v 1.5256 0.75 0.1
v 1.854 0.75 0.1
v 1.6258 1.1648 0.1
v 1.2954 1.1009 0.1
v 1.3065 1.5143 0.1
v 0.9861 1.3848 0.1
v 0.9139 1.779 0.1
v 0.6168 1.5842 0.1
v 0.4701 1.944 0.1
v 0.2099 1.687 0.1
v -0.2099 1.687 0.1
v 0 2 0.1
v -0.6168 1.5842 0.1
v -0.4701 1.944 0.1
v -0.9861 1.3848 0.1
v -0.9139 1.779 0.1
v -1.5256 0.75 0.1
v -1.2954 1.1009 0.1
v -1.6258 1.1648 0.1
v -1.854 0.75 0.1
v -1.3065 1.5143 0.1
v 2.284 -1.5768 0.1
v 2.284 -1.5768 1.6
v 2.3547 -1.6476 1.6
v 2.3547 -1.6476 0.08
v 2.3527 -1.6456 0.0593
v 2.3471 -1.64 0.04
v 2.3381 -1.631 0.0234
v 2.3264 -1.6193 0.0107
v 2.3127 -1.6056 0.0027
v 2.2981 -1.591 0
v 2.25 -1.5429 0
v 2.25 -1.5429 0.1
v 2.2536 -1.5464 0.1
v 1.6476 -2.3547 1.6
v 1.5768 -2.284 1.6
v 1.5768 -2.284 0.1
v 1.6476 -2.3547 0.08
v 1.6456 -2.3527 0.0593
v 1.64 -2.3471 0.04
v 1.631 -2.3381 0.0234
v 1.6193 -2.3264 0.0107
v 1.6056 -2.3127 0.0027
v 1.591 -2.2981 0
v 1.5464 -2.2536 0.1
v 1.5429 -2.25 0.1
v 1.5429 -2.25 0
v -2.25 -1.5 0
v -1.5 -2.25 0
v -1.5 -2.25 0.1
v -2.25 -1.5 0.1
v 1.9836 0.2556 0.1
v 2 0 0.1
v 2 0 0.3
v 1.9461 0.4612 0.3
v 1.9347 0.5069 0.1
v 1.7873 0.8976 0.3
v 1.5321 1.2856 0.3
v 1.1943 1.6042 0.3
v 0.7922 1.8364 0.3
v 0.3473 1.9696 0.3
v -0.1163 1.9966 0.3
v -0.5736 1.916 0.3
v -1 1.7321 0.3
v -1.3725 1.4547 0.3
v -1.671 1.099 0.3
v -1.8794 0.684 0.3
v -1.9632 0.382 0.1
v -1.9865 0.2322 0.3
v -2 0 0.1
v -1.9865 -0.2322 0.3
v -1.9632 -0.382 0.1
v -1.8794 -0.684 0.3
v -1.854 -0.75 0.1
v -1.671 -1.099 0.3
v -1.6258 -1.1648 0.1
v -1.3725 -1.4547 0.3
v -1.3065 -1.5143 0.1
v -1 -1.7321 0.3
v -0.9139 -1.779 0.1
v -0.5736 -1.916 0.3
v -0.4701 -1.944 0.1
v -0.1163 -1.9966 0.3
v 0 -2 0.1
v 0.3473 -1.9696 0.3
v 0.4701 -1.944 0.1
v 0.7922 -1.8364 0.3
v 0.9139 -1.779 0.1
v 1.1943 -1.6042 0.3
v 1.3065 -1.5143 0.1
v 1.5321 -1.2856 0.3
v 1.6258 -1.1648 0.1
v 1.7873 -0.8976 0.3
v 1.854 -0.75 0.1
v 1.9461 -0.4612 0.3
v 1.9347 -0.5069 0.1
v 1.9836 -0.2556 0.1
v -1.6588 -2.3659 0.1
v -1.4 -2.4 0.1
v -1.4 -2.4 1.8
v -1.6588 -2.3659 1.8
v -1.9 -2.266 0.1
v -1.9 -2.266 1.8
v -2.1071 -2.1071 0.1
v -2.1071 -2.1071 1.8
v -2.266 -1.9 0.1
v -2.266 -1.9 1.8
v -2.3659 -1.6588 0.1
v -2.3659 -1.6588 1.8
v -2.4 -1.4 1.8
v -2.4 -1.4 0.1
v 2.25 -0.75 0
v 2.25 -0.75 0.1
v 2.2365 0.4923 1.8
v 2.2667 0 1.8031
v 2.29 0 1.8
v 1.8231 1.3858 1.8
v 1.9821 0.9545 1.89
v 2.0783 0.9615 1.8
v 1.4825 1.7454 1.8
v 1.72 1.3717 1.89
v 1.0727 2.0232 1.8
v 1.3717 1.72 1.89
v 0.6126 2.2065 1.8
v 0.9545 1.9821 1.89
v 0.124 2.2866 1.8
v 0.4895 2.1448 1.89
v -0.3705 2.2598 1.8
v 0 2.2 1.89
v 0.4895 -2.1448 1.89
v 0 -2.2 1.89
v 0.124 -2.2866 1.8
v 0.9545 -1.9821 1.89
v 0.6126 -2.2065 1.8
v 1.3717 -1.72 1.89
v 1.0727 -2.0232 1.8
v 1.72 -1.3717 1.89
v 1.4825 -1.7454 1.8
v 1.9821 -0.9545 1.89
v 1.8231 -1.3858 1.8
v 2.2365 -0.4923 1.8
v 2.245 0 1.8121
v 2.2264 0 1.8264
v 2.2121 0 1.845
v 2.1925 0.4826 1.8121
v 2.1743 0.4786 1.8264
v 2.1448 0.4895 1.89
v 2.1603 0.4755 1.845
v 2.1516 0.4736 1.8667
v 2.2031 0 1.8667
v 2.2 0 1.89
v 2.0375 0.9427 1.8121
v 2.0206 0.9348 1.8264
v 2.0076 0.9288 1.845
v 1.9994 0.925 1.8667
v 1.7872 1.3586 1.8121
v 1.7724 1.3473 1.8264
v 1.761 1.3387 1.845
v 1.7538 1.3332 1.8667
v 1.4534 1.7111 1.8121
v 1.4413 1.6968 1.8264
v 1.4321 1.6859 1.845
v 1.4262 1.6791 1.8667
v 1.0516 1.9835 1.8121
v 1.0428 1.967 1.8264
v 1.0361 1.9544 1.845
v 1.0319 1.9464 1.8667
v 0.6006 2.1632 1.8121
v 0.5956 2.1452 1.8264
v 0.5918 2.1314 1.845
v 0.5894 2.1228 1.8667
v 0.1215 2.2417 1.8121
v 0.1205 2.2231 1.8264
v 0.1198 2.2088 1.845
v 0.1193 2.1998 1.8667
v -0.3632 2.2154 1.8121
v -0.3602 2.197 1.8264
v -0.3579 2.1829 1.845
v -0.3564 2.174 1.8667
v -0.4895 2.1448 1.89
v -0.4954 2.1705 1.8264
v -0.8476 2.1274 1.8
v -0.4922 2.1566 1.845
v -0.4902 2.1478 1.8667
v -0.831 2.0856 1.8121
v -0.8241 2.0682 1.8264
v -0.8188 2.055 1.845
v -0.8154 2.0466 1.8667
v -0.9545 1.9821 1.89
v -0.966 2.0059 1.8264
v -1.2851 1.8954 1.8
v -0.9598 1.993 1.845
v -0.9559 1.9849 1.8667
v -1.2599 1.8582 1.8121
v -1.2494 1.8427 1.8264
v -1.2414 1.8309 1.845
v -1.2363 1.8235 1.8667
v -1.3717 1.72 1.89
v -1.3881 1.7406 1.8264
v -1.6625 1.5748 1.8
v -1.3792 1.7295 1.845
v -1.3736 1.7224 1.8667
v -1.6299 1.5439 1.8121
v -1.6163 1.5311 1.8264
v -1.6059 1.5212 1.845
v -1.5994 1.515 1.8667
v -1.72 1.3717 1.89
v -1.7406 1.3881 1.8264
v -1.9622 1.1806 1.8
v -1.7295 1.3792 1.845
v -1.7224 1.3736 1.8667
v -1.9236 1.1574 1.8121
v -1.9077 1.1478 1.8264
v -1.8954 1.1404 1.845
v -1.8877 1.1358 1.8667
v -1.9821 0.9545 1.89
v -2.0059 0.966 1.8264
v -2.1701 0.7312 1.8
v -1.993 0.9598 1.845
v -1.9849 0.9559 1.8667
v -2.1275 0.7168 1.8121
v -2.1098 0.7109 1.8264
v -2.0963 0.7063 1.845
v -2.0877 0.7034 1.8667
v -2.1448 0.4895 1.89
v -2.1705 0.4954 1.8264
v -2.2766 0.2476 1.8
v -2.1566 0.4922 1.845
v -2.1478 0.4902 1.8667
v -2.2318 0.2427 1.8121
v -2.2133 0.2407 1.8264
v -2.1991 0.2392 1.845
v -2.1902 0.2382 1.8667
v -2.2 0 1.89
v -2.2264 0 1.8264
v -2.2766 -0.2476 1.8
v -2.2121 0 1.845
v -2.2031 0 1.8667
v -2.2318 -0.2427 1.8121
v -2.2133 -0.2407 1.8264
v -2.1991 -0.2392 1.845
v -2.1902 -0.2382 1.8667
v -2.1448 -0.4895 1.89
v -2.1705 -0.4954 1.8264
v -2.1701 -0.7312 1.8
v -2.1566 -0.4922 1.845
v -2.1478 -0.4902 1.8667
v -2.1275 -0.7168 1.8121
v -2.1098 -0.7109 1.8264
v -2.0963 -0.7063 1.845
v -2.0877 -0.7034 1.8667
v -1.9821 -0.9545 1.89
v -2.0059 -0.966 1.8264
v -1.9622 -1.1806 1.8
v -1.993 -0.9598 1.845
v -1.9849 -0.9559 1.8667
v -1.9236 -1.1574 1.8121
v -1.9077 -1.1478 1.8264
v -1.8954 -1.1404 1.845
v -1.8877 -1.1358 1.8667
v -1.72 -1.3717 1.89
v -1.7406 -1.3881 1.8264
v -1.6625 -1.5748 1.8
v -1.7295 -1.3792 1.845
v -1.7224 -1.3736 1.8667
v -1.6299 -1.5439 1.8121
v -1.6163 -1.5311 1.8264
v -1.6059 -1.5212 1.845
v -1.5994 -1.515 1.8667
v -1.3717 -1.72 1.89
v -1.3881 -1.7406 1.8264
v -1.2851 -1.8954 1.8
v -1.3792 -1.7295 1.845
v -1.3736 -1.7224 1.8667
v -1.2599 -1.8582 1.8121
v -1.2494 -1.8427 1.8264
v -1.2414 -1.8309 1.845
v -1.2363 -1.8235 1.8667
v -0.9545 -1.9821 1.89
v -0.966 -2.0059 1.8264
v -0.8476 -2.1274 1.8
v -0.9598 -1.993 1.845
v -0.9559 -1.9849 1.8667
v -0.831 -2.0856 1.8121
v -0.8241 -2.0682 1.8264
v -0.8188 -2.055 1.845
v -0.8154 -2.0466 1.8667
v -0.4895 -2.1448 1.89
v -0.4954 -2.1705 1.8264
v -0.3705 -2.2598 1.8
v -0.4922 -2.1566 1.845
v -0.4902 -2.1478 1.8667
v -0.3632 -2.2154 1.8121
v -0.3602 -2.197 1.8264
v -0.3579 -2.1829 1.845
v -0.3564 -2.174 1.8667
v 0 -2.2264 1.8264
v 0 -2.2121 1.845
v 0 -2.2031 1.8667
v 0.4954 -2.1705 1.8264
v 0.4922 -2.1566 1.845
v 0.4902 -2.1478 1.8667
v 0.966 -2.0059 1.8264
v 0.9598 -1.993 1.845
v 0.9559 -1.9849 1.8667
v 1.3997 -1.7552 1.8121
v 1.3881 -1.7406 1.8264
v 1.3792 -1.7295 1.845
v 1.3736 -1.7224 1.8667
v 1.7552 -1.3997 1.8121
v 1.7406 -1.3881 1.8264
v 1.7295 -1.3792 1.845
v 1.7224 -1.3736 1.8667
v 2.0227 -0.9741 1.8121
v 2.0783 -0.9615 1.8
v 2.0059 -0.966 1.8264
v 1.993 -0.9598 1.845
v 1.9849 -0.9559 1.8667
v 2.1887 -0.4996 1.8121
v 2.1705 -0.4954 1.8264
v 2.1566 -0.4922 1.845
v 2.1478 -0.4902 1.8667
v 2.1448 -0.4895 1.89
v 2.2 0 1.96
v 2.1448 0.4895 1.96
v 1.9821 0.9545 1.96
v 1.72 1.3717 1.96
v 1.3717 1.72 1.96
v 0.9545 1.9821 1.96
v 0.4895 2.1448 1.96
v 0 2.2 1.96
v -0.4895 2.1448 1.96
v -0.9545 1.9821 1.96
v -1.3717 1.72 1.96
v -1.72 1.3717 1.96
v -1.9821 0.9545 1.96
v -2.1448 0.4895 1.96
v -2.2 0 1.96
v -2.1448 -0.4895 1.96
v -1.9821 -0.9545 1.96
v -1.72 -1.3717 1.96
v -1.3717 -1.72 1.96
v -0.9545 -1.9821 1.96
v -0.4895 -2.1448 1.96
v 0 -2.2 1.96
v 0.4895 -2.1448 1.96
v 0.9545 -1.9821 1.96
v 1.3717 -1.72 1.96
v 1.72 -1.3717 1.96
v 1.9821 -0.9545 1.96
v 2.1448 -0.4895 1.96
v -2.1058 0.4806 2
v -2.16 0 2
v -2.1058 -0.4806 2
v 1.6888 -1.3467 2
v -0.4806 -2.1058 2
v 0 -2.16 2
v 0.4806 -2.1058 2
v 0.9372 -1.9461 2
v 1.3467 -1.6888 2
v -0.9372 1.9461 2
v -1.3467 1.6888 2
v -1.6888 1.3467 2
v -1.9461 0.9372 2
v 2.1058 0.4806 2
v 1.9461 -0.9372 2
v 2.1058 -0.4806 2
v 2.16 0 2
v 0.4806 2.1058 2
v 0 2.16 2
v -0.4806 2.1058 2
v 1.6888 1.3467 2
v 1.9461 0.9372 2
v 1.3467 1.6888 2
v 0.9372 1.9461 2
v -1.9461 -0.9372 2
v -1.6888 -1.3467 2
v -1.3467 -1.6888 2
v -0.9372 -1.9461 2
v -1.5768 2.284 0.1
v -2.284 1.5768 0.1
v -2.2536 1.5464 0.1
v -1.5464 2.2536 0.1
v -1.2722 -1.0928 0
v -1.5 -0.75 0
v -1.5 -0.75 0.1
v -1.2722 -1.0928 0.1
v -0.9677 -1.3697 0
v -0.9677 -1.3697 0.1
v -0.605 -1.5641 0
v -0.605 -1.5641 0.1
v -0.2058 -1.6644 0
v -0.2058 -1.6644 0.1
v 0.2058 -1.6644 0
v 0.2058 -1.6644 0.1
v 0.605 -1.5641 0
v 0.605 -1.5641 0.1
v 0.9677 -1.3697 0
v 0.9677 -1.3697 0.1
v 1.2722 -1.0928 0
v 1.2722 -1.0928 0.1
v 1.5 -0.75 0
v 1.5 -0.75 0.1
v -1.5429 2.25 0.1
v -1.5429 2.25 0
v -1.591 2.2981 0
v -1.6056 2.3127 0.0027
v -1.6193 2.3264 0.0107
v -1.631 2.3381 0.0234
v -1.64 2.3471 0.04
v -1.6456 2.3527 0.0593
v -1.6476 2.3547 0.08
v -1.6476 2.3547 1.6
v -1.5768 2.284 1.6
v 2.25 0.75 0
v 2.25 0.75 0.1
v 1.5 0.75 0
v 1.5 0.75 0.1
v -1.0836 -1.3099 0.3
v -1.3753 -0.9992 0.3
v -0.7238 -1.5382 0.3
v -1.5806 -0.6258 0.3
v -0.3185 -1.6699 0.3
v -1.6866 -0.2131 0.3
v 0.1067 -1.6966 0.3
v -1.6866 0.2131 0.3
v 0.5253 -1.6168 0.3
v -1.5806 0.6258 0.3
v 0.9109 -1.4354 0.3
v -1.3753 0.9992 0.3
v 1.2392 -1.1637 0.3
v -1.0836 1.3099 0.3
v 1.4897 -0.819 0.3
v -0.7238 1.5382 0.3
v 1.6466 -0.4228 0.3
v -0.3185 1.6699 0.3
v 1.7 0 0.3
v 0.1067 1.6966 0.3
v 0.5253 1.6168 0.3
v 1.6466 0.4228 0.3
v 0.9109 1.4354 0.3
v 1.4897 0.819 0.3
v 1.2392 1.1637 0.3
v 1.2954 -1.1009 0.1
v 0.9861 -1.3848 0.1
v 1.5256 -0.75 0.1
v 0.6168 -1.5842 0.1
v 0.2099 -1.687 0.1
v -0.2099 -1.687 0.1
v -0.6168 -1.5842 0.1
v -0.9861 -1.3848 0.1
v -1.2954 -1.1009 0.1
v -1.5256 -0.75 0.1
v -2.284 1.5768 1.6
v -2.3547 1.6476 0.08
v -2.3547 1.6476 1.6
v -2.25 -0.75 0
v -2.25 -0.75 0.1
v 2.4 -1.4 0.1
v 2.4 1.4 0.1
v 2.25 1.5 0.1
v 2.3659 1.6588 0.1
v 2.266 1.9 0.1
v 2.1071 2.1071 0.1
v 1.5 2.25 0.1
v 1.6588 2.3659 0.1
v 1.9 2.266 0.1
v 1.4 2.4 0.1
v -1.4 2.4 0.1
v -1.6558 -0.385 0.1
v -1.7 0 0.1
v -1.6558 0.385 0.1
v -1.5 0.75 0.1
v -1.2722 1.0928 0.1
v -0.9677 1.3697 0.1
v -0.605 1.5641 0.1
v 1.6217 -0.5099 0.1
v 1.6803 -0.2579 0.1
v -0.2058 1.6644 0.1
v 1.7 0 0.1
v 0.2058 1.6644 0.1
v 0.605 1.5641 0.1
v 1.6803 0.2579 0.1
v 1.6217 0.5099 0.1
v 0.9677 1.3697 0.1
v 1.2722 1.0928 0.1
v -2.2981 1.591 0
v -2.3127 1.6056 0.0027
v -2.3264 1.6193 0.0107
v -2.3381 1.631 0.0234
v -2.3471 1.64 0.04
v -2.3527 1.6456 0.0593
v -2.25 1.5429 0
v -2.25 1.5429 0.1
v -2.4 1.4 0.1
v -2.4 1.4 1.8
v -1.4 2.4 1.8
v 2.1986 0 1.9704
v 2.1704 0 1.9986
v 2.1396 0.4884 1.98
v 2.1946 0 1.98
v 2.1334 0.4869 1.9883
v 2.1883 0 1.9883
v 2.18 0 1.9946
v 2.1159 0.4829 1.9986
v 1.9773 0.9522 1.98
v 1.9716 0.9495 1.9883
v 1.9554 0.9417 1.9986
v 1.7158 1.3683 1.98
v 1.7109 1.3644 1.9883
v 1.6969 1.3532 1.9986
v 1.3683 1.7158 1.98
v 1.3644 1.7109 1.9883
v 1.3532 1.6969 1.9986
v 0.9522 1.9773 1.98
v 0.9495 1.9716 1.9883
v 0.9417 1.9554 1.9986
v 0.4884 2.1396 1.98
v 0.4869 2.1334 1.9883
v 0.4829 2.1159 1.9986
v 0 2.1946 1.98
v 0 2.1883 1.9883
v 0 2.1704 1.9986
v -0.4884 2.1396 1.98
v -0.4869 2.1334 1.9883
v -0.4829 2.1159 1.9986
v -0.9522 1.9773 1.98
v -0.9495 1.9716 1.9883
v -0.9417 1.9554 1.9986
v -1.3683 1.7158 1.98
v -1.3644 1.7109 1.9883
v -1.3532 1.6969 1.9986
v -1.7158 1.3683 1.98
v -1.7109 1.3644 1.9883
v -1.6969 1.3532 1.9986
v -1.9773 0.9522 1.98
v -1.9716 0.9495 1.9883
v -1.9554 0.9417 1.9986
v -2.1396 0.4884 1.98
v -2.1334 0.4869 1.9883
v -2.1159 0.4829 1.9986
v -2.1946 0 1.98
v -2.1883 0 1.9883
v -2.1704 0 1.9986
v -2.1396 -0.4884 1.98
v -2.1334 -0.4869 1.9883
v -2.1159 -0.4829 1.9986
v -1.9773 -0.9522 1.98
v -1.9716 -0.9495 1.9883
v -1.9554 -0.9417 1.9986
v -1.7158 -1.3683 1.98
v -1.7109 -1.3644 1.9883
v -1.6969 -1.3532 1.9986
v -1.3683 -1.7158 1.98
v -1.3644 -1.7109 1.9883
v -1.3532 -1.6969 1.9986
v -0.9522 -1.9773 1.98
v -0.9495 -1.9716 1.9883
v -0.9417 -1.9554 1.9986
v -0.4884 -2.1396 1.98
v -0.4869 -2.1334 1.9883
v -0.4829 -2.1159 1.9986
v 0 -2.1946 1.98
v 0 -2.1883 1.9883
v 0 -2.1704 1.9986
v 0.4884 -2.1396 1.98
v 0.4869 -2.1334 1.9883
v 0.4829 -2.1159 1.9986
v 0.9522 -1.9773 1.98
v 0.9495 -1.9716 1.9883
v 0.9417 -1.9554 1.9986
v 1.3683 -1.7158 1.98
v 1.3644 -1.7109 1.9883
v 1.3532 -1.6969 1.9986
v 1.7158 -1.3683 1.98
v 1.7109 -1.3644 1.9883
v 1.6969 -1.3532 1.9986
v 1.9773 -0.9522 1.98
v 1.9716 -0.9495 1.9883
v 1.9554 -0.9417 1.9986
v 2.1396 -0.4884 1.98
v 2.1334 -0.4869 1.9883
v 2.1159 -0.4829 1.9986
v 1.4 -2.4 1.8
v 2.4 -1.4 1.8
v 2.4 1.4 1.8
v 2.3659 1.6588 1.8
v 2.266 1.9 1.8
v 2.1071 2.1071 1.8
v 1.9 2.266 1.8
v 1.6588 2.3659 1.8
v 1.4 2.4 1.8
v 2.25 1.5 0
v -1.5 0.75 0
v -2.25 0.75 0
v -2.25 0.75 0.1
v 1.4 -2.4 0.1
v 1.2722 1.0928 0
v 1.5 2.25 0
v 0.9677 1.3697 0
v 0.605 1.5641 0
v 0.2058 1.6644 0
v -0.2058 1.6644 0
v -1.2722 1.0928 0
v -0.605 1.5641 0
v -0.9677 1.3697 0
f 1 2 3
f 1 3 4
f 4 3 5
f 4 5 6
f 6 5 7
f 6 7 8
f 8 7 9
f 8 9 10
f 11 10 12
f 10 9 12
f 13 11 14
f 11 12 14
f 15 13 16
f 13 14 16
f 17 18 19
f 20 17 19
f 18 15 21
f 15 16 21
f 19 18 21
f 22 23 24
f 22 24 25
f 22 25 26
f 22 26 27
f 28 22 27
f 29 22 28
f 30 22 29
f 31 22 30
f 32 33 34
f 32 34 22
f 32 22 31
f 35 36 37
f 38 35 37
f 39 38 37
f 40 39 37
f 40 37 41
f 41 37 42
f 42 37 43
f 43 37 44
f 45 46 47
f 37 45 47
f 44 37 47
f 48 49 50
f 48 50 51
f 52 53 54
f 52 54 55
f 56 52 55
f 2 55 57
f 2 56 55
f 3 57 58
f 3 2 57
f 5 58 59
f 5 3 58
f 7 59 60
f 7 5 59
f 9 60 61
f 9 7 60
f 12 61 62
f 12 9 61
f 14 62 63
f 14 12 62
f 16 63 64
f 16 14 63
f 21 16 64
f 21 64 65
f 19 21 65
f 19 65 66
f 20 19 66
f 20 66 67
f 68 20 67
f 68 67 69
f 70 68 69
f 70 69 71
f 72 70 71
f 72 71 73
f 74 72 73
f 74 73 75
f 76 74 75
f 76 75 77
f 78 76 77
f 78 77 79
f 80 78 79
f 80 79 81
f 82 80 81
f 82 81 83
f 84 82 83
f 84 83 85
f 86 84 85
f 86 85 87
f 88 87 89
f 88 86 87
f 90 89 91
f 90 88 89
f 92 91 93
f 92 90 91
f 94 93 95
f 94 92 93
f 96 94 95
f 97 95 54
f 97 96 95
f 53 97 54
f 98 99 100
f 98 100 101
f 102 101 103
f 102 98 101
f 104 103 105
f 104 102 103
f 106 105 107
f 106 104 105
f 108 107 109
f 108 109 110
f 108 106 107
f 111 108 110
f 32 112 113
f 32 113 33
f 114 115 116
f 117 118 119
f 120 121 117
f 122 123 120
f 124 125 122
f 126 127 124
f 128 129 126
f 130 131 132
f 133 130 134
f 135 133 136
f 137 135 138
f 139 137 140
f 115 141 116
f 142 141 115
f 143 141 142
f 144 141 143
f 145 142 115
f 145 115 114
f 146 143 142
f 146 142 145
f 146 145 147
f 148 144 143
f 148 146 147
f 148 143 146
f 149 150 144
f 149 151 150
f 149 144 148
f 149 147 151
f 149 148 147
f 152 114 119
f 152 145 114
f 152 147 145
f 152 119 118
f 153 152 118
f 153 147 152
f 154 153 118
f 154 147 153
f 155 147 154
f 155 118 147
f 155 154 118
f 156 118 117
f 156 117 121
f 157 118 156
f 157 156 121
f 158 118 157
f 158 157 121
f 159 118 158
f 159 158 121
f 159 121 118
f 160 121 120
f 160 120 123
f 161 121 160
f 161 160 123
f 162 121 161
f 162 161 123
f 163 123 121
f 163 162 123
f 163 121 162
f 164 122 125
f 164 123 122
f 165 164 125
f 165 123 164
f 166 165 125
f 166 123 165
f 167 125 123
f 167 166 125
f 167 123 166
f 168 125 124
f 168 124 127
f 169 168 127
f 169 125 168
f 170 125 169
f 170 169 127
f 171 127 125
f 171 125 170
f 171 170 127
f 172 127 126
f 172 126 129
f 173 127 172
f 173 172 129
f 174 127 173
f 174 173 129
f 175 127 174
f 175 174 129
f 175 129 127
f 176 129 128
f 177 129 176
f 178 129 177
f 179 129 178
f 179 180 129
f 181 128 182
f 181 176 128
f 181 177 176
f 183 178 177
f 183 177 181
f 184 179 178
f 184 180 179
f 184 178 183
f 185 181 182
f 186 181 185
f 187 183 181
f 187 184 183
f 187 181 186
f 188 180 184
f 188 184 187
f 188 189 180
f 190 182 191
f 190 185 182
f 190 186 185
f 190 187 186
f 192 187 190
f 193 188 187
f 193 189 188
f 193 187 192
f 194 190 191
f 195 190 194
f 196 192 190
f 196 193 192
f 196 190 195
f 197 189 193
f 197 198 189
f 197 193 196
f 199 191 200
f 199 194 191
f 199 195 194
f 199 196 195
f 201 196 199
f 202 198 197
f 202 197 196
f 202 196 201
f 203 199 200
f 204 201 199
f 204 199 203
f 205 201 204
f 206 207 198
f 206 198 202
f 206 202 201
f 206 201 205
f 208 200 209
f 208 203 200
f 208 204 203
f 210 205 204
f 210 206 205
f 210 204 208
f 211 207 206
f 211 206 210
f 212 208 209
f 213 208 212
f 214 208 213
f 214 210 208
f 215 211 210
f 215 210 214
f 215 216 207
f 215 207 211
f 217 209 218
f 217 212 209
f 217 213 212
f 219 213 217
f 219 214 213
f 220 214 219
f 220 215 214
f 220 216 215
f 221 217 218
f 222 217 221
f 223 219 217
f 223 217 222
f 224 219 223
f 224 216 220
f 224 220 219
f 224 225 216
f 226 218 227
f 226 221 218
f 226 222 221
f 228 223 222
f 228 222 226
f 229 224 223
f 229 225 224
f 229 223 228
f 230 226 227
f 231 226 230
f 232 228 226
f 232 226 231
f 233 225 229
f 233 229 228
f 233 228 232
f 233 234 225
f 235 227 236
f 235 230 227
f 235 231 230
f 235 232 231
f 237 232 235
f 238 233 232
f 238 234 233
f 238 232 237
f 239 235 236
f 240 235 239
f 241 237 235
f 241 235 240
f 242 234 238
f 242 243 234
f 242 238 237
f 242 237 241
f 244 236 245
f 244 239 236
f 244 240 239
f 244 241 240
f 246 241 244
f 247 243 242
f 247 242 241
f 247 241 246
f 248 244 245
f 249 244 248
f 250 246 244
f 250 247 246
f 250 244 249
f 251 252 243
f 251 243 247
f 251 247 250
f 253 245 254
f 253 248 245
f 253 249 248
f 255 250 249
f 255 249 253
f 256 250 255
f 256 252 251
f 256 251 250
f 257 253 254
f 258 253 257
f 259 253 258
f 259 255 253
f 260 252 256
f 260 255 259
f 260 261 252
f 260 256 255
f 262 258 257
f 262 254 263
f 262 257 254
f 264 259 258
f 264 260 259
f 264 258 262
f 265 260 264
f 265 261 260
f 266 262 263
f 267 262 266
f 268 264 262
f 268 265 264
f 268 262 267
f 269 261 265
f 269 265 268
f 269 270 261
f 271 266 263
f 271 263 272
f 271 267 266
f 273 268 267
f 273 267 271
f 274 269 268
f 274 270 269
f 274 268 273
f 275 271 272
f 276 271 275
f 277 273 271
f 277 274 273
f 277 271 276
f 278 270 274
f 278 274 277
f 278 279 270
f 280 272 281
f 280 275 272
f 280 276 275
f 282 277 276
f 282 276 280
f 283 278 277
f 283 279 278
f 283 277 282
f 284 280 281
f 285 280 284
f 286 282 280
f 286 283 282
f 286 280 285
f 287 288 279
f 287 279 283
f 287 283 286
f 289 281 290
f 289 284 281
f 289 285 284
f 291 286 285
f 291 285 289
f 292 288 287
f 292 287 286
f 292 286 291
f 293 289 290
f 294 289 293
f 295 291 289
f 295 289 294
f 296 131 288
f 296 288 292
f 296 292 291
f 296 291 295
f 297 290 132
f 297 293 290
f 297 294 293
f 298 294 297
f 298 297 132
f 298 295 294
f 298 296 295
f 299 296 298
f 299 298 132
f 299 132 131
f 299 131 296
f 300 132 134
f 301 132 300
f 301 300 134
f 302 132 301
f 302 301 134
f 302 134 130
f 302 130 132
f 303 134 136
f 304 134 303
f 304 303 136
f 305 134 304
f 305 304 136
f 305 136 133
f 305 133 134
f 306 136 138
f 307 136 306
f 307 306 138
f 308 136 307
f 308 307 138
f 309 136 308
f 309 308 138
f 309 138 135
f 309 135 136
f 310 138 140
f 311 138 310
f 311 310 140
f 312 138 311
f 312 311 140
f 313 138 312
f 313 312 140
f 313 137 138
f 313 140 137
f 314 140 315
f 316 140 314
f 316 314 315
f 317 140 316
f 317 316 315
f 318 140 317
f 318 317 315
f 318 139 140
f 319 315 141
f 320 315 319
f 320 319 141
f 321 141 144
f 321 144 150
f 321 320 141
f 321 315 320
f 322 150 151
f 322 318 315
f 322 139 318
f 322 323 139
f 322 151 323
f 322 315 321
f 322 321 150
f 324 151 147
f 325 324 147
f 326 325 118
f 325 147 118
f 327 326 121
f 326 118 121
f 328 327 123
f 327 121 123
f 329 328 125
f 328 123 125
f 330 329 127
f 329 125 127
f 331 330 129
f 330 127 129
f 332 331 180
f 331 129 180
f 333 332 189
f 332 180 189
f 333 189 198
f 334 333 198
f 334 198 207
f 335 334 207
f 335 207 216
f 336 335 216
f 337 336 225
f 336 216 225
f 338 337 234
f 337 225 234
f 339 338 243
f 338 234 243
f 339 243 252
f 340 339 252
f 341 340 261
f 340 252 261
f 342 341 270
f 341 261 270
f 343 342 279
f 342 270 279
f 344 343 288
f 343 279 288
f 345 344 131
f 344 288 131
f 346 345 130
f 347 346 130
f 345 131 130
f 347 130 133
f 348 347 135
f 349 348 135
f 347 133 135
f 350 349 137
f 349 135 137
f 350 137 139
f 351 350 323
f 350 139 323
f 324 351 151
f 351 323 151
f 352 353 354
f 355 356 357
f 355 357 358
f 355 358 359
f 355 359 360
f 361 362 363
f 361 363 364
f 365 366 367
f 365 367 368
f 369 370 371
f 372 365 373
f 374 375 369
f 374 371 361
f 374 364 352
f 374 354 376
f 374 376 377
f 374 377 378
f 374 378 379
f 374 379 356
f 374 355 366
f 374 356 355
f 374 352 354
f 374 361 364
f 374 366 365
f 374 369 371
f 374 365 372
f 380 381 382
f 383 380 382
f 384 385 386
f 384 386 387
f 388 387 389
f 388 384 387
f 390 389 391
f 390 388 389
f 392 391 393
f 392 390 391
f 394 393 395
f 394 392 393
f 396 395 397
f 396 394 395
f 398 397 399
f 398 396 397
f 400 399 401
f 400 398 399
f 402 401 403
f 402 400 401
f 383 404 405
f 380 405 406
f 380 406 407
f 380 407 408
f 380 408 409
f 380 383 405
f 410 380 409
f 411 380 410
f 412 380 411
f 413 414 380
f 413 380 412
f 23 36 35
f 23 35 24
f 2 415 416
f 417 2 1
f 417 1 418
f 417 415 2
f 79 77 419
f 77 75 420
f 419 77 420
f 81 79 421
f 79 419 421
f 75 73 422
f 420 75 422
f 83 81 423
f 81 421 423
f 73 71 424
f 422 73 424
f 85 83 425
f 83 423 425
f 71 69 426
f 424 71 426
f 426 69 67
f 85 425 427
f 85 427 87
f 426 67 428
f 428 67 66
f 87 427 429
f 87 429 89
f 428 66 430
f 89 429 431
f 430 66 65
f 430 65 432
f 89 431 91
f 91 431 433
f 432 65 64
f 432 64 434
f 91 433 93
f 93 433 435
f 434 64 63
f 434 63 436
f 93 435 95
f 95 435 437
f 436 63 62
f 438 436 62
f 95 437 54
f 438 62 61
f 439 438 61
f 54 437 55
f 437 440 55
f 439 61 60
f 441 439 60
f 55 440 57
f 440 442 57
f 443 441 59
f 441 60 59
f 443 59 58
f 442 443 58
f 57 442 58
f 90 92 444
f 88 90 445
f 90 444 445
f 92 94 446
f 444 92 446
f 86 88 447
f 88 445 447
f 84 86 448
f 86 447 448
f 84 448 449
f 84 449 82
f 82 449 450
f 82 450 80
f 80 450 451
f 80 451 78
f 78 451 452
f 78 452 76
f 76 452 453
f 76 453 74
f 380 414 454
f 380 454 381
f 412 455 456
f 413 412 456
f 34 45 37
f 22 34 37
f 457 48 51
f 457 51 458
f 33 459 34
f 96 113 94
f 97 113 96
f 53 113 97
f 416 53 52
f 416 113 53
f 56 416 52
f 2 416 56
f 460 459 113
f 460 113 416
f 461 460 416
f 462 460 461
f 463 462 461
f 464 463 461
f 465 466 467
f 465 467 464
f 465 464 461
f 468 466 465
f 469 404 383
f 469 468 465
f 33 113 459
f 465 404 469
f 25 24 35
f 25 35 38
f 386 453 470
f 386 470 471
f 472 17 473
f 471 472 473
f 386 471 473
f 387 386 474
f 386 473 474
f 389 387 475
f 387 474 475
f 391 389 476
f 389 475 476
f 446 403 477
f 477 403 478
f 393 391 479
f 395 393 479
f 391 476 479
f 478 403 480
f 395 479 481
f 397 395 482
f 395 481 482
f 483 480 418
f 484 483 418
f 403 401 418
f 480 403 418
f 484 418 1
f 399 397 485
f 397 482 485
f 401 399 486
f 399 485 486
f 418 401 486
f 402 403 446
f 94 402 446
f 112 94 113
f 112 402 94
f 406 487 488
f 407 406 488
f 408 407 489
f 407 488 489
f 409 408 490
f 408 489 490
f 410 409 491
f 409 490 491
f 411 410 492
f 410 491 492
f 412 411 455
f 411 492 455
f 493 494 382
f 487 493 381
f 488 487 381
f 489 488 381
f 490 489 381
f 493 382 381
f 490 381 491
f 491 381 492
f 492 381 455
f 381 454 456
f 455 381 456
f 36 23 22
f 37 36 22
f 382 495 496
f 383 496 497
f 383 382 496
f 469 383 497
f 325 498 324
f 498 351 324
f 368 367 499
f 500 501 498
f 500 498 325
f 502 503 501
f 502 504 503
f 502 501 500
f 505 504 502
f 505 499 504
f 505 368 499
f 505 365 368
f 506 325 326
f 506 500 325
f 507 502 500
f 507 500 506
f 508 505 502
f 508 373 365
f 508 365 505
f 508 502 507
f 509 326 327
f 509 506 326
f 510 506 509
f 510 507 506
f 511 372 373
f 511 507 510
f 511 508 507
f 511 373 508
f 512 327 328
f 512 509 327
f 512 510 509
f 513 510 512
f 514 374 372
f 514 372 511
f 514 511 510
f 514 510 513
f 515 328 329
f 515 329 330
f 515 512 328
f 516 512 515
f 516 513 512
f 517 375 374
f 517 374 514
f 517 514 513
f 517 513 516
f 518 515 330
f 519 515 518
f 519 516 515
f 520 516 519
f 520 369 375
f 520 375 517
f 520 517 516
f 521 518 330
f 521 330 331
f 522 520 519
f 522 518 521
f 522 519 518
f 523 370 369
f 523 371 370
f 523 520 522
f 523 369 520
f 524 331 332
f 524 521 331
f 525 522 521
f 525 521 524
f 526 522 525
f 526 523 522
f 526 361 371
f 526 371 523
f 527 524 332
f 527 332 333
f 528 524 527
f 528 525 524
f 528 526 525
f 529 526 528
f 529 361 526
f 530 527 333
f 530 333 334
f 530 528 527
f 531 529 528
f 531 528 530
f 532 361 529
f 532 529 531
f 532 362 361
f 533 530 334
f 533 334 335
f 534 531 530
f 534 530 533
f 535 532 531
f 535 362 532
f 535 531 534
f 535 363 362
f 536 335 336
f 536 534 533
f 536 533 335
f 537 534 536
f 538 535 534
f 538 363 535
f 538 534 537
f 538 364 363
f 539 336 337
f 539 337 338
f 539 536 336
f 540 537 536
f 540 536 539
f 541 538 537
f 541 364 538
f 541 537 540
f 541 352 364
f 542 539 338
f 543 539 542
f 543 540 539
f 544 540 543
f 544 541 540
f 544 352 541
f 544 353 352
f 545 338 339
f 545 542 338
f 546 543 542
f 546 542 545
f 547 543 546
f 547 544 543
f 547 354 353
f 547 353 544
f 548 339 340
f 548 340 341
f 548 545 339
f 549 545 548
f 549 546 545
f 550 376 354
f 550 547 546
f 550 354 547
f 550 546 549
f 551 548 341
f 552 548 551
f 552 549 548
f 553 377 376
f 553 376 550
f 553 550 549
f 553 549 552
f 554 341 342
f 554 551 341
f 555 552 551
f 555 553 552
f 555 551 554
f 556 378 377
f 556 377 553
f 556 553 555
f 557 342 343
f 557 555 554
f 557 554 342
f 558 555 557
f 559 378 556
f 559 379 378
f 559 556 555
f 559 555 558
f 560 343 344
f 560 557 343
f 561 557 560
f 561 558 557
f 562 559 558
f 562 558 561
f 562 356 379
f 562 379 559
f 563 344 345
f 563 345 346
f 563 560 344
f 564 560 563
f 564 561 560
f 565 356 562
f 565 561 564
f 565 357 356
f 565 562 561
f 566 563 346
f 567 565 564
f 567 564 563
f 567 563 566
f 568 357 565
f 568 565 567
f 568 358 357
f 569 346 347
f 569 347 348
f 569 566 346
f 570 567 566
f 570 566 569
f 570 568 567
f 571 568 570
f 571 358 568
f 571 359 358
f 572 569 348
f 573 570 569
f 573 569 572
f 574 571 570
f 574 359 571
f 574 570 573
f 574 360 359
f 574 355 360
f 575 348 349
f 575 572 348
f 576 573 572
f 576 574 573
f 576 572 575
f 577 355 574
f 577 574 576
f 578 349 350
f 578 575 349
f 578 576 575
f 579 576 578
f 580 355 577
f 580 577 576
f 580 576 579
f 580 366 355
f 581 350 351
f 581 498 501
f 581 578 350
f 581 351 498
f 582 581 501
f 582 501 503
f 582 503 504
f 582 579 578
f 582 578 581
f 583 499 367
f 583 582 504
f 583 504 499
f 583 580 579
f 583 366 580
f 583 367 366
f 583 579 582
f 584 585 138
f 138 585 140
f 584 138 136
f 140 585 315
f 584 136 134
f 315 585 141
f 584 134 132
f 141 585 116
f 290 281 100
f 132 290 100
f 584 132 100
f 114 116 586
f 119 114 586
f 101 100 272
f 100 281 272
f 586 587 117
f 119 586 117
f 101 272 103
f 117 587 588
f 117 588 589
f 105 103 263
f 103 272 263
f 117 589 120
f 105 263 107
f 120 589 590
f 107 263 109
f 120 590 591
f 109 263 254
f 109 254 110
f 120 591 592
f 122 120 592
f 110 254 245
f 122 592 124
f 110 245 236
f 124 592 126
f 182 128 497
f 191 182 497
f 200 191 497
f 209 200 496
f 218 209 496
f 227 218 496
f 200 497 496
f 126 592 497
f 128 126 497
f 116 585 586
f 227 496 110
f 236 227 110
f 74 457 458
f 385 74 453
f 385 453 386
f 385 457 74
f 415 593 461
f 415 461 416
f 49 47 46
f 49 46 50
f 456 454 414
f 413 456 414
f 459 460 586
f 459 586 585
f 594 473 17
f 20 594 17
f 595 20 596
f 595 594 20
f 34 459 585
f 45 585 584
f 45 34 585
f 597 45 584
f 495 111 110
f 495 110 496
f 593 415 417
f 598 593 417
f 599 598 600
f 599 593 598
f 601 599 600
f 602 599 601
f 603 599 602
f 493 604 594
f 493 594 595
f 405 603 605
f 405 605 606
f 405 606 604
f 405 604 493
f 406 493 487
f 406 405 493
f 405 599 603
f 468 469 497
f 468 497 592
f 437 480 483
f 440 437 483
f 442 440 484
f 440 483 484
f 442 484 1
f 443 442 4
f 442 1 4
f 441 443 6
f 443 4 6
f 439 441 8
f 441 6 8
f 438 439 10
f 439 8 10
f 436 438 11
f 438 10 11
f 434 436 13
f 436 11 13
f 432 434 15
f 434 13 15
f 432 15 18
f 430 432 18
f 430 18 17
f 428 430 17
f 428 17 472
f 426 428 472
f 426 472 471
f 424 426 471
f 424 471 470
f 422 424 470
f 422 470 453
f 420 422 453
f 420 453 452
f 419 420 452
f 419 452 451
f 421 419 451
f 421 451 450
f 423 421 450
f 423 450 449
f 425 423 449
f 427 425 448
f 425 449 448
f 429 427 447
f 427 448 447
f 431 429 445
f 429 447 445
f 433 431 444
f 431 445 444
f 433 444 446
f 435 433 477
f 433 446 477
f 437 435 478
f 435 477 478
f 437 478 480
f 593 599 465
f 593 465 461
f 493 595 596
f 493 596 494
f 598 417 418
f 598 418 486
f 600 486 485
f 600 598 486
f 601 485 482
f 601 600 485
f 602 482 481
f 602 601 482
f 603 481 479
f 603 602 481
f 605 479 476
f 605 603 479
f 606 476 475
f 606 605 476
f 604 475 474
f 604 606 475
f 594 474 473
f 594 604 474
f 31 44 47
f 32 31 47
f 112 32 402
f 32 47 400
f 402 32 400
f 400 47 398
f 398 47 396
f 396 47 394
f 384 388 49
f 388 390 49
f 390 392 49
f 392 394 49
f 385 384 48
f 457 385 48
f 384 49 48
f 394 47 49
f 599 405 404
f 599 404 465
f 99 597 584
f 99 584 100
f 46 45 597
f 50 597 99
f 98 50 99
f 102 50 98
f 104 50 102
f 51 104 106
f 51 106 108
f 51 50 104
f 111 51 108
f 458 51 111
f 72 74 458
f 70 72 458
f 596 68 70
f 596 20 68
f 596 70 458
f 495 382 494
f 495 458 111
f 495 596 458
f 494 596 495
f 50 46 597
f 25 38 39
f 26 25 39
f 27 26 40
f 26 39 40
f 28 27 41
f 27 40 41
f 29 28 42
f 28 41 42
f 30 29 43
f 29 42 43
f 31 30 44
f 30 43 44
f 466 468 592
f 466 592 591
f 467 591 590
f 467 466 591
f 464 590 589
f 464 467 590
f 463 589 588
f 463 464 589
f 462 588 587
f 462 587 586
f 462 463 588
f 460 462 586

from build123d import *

# Parameters (mm, degrees)
EXTRUDE_START       = 0.1
EXTRUDE_1_DEPTH     = 1.7
SKETCH_6_R          = 2
CUT_EXTRUDE_5_DEPTH = 0.3
SKETCH_8_R          = 1.7
EXTRUDE_9_DEPTH     = 0.25
SKETCH_9_R          = 2.2
EXTRUDE_1_2_DEPTH   = 0.2
FILLET_2_R          = 0.09
FILLET_3_R          = 0.04
EXTRUDE_2_DEPTH     = 0.1
EXTRUDE_START_2     = 2.73
SKETCH_11_W         = 1.5
SKETCH_11_H         = 1
EXTRUDE_3_DEPTH     = 0.1
EXTRUDE_START_3     = -2.73
SKETCH_11_2_W       = 1.5
SKETCH_11_2_H       = 1
EXTRUDE_4_DEPTH     = 0.1
EXTRUDE_START_4     = 0.5
EXTRUDE_5_DEPTH     = 1


with BuildPart() as part:
    # Эскиз2 → Extrude 1 (new body)
    with BuildSketch(Plane.XY.offset(EXTRUDE_START)):
        with BuildLine():
            Line((-1.4, 2.4), (1.4, 2.4))
            ThreePointArc((1.4, 2.4), (2.107106781, 2.107106781), (2.4, 1.4))
            Line((2.4, 1.4), (2.4, -1.4))
            Line((2.4, -1.4), (1.4, -2.4))
            Line((1.4, -2.4), (-1.4, -2.4))
            ThreePointArc((-1.4, -2.4), (-2.107106781, -2.107106781), (-2.4, -1.4))
            Line((-2.4, -1.4), (-2.4, 1.4))
            Line((-2.4, 1.4), (-1.4, 2.4))
        make_face()
    extrude(amount=EXTRUDE_1_DEPTH)

    # Эскиз6 → Вытянуть5 (cut)
    with BuildSketch(Plane.XY):
        Circle(SKETCH_6_R)
    extrude(amount=CUT_EXTRUDE_5_DEPTH, mode=Mode.SUBTRACT)

    # Эскиз8 → Вытянуть9 (add)
    with BuildSketch(Plane.XY.offset(EXTRUDE_START)):
        Circle(SKETCH_8_R)
    extrude(amount=EXTRUDE_9_DEPTH)

    # Эскиз9 → Extrude 1 2 (add)
    with BuildSketch(Plane.XY.offset(1.8)):
        Circle(SKETCH_9_R)
    extrude(amount=EXTRUDE_1_2_DEPTH)

    # Скругление2
    fillet_2_edges = [part.edges().sort_by_distance(p)[0] for p in [
        (-2.2, 0, 1.8),
    ]]
    fillet(fillet_2_edges, radius=FILLET_2_R)

    # Скругление3
    fillet_3_edges = [part.edges().sort_by_distance(p)[0] for p in [
        (-2.2, 0, 2),
    ]]
    fillet(fillet_3_edges, radius=FILLET_3_R)

    # Эскиз10 → Бобышка-Вытянуть2 (add)
    with BuildSketch(Plane.XY):
        with BuildLine():
            Line((2.25, 0.75), (1.5, 0.75))
            ThreePointArc((1.5, 0.75), (0, 1.677050983), (-1.5, 0.75))
            Line((-1.5, 0.75), (-2.25, 0.75))
            Line((-2.25, 0.75), (-2.25, 1.55))
            Line((-2.25, 1.55), (-1.55, 2.25))
            Line((-1.55, 2.25), (1.5, 2.25))
            Line((1.5, 2.25), (2.25, 1.5))
            Line((2.25, 1.5), (2.25, 0.75))
        make_face()
        with BuildLine():
            Line((-2.25, -0.75), (-1.5, -0.75))
            ThreePointArc((-1.5, -0.75), (0, -1.677050983), (1.5, -0.75))
            Line((1.5, -0.75), (2.25, -0.75))
            Line((2.25, -0.75), (2.25, -1.55))
            Line((2.25, -1.55), (1.55, -2.25))
            Line((1.55, -2.25), (-1.5, -2.25))
            Line((-1.5, -2.25), (-2.25, -1.5))
            Line((-2.25, -1.5), (-2.25, -0.75))
        make_face()
    extrude(amount=EXTRUDE_2_DEPTH)



with BuildPart() as body_2:
    # Эскиз11 → Бобышка-Вытянуть3 (new body)
    with BuildSketch(Plane(origin=(0, 0, 0), x_dir=(0, 0, -1), z_dir=(0.7071067811865488, -0.7071067811865462, 0)).offset(EXTRUDE_START_2)):
        with Locations((-0.85, 0)):
            Rectangle(SKETCH_11_W, SKETCH_11_H)
    extrude(amount=EXTRUDE_3_DEPTH)


with BuildPart() as body_3:
    # Эскиз11<2> → Бобышка-Вытянуть4 (new body)
    with BuildSketch(Plane(origin=(0, 0, 0), x_dir=(0, 0, -1), z_dir=(0.7071067811865488, -0.7071067811865462, 0)).offset(EXTRUDE_START_3)):
        with Locations((-0.85, 0)):
            Rectangle(SKETCH_11_2_W, SKETCH_11_2_H)
    extrude(amount=-EXTRUDE_4_DEPTH)


with BuildPart() as part_1:
    add(part.part)

    add(body_2.part)  # Бобышка-Вытянуть5 merges body 2

    add(body_3.part)  # Бобышка-Вытянуть5 merges body 3
    # Эскиз12 → Бобышка-Вытянуть5 (add)
    with BuildSketch(Plane(origin=(0, 0, 0), x_dir=(0.7071067811865488, -0.7071067811865462, 0), z_dir=(-0.7071067811865462, -0.7071067811865488, 0)).offset(EXTRUDE_START_4)):
        with BuildLine():
            Line((2.83, 0.15), (2.83, 0.08))
            ThreePointArc((2.83, 0.08), (2.806568542, 0.023431458), (2.75, 0))
            Line((2.75, 0), (2.6, 0))
            Line((2.6, 0), (2.6, 0.1))
            Line((2.6, 0.1), (2.73, 0.1))
            Line((2.73, 0.1), (2.73, 0.15))
            Line((2.73, 0.15), (2.83, 0.15))
        make_face()
        with BuildLine():
            Line((-2.6, 0.1), (-2.6, 0))
            Line((-2.6, 0), (-2.75, 0))
            ThreePointArc((-2.75, 0), (-2.806568542, 0.023431458), (-2.83, 0.08))
            Line((-2.83, 0.08), (-2.83, 0.15))
            Line((-2.83, 0.15), (-2.73, 0.15))
            Line((-2.73, 0.15), (-2.73, 0.1))
            Line((-2.73, 0.1), (-2.6, 0.1))
        make_face()
    extrude(amount=-EXTRUDE_5_DEPTH)


solid = part_1.part
